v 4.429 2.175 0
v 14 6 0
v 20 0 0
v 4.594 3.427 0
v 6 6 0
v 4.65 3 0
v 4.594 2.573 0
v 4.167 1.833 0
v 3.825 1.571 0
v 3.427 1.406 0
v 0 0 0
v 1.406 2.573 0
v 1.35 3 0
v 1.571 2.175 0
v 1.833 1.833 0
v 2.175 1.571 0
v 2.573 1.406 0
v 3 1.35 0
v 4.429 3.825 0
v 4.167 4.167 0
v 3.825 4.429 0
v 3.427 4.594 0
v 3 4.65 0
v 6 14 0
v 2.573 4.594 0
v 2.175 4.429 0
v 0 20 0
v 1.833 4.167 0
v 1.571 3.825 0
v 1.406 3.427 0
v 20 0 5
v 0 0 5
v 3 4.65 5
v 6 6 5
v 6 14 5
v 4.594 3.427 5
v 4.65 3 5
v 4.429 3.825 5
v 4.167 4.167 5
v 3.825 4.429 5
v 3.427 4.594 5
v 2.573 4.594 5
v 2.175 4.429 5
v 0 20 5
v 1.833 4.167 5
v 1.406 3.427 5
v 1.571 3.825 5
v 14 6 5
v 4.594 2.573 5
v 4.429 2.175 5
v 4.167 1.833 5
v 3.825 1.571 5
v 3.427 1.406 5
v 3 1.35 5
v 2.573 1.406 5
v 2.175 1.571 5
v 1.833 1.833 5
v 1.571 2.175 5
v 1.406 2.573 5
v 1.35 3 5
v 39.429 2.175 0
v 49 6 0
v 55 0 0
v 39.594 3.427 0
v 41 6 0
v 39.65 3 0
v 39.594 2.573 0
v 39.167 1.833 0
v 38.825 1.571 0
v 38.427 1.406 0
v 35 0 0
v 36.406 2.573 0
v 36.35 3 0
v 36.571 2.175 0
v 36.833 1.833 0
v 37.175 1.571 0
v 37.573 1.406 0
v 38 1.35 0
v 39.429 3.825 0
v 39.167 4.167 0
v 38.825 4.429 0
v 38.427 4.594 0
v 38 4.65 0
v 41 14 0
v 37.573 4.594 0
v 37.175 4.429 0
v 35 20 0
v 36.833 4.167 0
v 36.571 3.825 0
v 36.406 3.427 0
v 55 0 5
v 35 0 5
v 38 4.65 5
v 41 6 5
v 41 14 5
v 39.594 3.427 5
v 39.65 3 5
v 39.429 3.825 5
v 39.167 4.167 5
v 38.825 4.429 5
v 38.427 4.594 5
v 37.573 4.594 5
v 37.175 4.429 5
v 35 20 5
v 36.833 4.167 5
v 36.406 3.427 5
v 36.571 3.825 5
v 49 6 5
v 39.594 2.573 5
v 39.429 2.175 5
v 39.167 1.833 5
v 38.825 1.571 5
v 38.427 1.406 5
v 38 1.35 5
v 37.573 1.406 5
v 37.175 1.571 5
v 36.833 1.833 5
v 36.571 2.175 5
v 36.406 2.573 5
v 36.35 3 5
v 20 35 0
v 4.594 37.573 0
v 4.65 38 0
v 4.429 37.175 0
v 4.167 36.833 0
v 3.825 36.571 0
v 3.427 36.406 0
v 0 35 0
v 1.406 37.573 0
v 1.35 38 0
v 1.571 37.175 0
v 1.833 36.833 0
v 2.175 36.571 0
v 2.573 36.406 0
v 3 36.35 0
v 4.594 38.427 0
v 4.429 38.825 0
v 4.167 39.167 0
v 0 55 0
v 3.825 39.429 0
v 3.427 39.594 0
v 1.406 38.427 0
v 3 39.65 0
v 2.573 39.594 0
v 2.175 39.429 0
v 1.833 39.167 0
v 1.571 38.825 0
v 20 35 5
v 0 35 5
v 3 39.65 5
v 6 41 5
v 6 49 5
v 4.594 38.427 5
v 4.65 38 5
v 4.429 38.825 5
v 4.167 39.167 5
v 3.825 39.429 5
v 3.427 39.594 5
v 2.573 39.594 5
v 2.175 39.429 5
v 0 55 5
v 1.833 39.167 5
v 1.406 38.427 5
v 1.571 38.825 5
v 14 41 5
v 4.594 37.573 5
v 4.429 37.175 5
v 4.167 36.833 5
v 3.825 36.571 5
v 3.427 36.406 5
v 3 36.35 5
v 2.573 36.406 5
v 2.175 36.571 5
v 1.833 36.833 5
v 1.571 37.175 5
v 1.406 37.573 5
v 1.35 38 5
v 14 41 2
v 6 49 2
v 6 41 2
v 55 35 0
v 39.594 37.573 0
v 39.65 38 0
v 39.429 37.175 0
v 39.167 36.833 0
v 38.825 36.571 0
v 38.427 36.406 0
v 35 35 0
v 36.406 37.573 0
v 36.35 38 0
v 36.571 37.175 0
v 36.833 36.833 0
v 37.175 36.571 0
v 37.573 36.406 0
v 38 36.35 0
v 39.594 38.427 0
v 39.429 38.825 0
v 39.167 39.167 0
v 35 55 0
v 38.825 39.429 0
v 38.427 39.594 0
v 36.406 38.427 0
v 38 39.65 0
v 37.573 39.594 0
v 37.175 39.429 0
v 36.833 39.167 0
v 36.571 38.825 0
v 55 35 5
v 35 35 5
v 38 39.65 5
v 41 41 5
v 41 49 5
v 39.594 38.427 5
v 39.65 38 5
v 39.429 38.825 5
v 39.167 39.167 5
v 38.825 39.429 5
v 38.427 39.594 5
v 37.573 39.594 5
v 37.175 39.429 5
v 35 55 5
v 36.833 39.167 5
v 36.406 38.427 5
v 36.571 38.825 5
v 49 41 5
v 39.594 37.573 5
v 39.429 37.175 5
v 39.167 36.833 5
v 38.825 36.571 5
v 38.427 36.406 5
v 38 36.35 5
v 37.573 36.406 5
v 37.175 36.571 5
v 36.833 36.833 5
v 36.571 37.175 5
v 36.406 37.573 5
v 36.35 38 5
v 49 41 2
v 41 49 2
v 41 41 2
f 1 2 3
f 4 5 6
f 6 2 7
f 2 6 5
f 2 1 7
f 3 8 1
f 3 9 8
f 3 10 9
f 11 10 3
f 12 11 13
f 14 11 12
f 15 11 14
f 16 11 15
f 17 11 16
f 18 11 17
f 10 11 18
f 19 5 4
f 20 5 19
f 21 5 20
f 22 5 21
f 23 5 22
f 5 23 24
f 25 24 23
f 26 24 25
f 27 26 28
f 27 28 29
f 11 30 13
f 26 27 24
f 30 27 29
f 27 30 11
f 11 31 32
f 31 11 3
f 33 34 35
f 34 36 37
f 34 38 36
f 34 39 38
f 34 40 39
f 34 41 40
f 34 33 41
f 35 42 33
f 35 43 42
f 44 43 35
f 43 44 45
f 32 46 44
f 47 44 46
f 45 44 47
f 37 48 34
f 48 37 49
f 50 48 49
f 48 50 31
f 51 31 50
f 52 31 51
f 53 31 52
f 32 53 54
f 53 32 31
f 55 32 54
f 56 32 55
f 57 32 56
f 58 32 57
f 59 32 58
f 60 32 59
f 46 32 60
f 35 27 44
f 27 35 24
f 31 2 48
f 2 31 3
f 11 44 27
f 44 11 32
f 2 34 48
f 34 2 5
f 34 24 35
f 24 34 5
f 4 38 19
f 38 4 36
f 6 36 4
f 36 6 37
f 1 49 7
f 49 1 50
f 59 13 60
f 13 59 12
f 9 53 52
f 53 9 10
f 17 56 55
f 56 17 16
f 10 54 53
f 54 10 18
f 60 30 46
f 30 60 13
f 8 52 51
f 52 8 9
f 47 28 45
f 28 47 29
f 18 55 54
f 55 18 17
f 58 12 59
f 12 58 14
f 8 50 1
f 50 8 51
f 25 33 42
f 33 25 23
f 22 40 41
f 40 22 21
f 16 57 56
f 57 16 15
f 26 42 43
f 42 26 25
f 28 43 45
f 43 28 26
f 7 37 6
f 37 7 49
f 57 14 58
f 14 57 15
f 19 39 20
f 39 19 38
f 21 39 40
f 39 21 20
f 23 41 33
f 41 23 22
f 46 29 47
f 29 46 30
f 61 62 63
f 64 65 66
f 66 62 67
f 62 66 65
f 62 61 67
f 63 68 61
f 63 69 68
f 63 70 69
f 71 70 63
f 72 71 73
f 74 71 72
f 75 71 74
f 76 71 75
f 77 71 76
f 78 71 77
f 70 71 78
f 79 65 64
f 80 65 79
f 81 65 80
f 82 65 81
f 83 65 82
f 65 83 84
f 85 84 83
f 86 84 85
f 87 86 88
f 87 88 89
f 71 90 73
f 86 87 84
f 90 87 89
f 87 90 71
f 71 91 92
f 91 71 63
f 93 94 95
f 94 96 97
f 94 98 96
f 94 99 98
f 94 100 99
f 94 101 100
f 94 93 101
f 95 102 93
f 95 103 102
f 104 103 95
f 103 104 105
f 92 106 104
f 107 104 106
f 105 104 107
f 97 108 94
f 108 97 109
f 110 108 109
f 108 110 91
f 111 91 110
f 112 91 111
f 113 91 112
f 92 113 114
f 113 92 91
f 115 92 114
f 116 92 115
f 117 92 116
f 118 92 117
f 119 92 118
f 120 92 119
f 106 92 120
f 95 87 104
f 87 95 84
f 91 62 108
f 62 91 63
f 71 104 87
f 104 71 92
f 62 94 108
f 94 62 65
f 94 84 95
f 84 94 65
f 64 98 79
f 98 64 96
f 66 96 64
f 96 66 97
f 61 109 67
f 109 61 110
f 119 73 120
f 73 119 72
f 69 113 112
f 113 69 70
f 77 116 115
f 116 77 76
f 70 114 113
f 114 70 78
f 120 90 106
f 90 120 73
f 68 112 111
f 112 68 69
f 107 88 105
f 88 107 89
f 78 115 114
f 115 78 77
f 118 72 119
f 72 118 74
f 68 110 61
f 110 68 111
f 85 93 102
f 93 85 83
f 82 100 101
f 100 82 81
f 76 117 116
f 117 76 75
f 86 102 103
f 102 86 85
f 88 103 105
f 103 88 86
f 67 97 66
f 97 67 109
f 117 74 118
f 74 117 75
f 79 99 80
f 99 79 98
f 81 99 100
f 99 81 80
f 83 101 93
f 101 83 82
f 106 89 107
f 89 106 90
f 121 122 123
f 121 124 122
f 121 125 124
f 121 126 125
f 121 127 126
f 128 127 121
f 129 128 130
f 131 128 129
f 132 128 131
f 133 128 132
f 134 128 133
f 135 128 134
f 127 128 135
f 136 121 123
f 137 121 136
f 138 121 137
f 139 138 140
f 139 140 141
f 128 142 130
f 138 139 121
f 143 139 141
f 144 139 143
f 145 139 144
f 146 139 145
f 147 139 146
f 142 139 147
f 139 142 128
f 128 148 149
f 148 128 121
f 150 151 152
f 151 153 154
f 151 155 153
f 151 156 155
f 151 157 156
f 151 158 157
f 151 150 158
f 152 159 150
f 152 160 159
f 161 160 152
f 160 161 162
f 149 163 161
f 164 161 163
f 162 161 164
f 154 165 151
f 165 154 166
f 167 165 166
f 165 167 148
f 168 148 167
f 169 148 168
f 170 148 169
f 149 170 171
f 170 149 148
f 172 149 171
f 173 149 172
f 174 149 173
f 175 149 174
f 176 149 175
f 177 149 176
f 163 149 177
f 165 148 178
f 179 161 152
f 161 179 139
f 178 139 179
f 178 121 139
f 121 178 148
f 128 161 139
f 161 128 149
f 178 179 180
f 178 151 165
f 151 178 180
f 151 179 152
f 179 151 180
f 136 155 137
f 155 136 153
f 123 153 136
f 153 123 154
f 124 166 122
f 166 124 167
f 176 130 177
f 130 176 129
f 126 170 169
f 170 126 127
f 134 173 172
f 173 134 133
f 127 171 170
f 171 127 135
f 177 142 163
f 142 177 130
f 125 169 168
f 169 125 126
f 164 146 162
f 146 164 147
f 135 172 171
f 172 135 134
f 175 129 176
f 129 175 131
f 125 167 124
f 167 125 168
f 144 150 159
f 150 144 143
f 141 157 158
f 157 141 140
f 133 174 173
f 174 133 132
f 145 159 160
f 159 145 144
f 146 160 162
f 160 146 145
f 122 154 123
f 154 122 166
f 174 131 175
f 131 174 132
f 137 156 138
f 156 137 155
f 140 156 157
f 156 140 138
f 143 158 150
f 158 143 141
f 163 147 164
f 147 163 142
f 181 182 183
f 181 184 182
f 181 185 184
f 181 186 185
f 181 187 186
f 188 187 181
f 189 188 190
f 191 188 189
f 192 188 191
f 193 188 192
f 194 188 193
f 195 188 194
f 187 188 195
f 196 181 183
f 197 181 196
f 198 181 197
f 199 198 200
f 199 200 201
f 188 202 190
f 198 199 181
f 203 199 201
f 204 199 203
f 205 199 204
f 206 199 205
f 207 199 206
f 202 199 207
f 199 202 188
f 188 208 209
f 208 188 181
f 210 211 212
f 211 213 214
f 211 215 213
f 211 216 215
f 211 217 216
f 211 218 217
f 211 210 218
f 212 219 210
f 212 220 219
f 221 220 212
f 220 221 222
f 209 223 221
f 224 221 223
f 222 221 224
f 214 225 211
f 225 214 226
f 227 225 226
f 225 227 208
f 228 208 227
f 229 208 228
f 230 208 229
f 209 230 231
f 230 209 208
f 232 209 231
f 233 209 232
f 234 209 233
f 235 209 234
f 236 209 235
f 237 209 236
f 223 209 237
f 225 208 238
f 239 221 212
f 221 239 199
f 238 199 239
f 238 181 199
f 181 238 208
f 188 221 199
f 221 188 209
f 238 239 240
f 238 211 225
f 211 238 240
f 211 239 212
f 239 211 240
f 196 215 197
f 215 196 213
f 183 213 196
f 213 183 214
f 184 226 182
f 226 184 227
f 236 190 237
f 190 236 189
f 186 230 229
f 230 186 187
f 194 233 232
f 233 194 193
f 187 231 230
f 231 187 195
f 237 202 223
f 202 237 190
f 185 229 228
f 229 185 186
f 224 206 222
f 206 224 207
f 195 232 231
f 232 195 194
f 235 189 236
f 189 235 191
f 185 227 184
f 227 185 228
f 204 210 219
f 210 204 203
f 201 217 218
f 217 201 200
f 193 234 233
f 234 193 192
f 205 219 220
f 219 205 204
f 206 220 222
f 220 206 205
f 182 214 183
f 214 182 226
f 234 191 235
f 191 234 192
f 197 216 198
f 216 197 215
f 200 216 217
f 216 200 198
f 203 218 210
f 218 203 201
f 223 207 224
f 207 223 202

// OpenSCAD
/*
	Glass plate holder
	By Humberto Kelkboom
	Lark3D.nl
	
	Changed: Inserted adjustable side thikness.
*/

//The width of the triange
WidthOffTriagle=25;
//The width of the Sides
WithOffSides = 6;

module triangle(width,length,h)
{
	linear_extrude(height=h) 
	polygon([[0,0],[0,width],[length,0]]);
}

module PlateHolder(OOC){
difference(){
triangle(20,20,5);
translate([WithOffSides,WithOffSides,(OOC=="open"?-0.5:2)])triangle(10,10,6);
translate([3,3,2.5])cylinder(r=1.65, h=6, center=true,$fn=24);
}
};

PlateHolder("open");
translate([WidthOffTriagle +10,0,0])PlateHolder("open");
translate([0,WidthOffTriagle +10,0])PlateHolder("close");
translate([WidthOffTriagle +10,WidthOffTriagle +10,0])PlateHolder("close");
